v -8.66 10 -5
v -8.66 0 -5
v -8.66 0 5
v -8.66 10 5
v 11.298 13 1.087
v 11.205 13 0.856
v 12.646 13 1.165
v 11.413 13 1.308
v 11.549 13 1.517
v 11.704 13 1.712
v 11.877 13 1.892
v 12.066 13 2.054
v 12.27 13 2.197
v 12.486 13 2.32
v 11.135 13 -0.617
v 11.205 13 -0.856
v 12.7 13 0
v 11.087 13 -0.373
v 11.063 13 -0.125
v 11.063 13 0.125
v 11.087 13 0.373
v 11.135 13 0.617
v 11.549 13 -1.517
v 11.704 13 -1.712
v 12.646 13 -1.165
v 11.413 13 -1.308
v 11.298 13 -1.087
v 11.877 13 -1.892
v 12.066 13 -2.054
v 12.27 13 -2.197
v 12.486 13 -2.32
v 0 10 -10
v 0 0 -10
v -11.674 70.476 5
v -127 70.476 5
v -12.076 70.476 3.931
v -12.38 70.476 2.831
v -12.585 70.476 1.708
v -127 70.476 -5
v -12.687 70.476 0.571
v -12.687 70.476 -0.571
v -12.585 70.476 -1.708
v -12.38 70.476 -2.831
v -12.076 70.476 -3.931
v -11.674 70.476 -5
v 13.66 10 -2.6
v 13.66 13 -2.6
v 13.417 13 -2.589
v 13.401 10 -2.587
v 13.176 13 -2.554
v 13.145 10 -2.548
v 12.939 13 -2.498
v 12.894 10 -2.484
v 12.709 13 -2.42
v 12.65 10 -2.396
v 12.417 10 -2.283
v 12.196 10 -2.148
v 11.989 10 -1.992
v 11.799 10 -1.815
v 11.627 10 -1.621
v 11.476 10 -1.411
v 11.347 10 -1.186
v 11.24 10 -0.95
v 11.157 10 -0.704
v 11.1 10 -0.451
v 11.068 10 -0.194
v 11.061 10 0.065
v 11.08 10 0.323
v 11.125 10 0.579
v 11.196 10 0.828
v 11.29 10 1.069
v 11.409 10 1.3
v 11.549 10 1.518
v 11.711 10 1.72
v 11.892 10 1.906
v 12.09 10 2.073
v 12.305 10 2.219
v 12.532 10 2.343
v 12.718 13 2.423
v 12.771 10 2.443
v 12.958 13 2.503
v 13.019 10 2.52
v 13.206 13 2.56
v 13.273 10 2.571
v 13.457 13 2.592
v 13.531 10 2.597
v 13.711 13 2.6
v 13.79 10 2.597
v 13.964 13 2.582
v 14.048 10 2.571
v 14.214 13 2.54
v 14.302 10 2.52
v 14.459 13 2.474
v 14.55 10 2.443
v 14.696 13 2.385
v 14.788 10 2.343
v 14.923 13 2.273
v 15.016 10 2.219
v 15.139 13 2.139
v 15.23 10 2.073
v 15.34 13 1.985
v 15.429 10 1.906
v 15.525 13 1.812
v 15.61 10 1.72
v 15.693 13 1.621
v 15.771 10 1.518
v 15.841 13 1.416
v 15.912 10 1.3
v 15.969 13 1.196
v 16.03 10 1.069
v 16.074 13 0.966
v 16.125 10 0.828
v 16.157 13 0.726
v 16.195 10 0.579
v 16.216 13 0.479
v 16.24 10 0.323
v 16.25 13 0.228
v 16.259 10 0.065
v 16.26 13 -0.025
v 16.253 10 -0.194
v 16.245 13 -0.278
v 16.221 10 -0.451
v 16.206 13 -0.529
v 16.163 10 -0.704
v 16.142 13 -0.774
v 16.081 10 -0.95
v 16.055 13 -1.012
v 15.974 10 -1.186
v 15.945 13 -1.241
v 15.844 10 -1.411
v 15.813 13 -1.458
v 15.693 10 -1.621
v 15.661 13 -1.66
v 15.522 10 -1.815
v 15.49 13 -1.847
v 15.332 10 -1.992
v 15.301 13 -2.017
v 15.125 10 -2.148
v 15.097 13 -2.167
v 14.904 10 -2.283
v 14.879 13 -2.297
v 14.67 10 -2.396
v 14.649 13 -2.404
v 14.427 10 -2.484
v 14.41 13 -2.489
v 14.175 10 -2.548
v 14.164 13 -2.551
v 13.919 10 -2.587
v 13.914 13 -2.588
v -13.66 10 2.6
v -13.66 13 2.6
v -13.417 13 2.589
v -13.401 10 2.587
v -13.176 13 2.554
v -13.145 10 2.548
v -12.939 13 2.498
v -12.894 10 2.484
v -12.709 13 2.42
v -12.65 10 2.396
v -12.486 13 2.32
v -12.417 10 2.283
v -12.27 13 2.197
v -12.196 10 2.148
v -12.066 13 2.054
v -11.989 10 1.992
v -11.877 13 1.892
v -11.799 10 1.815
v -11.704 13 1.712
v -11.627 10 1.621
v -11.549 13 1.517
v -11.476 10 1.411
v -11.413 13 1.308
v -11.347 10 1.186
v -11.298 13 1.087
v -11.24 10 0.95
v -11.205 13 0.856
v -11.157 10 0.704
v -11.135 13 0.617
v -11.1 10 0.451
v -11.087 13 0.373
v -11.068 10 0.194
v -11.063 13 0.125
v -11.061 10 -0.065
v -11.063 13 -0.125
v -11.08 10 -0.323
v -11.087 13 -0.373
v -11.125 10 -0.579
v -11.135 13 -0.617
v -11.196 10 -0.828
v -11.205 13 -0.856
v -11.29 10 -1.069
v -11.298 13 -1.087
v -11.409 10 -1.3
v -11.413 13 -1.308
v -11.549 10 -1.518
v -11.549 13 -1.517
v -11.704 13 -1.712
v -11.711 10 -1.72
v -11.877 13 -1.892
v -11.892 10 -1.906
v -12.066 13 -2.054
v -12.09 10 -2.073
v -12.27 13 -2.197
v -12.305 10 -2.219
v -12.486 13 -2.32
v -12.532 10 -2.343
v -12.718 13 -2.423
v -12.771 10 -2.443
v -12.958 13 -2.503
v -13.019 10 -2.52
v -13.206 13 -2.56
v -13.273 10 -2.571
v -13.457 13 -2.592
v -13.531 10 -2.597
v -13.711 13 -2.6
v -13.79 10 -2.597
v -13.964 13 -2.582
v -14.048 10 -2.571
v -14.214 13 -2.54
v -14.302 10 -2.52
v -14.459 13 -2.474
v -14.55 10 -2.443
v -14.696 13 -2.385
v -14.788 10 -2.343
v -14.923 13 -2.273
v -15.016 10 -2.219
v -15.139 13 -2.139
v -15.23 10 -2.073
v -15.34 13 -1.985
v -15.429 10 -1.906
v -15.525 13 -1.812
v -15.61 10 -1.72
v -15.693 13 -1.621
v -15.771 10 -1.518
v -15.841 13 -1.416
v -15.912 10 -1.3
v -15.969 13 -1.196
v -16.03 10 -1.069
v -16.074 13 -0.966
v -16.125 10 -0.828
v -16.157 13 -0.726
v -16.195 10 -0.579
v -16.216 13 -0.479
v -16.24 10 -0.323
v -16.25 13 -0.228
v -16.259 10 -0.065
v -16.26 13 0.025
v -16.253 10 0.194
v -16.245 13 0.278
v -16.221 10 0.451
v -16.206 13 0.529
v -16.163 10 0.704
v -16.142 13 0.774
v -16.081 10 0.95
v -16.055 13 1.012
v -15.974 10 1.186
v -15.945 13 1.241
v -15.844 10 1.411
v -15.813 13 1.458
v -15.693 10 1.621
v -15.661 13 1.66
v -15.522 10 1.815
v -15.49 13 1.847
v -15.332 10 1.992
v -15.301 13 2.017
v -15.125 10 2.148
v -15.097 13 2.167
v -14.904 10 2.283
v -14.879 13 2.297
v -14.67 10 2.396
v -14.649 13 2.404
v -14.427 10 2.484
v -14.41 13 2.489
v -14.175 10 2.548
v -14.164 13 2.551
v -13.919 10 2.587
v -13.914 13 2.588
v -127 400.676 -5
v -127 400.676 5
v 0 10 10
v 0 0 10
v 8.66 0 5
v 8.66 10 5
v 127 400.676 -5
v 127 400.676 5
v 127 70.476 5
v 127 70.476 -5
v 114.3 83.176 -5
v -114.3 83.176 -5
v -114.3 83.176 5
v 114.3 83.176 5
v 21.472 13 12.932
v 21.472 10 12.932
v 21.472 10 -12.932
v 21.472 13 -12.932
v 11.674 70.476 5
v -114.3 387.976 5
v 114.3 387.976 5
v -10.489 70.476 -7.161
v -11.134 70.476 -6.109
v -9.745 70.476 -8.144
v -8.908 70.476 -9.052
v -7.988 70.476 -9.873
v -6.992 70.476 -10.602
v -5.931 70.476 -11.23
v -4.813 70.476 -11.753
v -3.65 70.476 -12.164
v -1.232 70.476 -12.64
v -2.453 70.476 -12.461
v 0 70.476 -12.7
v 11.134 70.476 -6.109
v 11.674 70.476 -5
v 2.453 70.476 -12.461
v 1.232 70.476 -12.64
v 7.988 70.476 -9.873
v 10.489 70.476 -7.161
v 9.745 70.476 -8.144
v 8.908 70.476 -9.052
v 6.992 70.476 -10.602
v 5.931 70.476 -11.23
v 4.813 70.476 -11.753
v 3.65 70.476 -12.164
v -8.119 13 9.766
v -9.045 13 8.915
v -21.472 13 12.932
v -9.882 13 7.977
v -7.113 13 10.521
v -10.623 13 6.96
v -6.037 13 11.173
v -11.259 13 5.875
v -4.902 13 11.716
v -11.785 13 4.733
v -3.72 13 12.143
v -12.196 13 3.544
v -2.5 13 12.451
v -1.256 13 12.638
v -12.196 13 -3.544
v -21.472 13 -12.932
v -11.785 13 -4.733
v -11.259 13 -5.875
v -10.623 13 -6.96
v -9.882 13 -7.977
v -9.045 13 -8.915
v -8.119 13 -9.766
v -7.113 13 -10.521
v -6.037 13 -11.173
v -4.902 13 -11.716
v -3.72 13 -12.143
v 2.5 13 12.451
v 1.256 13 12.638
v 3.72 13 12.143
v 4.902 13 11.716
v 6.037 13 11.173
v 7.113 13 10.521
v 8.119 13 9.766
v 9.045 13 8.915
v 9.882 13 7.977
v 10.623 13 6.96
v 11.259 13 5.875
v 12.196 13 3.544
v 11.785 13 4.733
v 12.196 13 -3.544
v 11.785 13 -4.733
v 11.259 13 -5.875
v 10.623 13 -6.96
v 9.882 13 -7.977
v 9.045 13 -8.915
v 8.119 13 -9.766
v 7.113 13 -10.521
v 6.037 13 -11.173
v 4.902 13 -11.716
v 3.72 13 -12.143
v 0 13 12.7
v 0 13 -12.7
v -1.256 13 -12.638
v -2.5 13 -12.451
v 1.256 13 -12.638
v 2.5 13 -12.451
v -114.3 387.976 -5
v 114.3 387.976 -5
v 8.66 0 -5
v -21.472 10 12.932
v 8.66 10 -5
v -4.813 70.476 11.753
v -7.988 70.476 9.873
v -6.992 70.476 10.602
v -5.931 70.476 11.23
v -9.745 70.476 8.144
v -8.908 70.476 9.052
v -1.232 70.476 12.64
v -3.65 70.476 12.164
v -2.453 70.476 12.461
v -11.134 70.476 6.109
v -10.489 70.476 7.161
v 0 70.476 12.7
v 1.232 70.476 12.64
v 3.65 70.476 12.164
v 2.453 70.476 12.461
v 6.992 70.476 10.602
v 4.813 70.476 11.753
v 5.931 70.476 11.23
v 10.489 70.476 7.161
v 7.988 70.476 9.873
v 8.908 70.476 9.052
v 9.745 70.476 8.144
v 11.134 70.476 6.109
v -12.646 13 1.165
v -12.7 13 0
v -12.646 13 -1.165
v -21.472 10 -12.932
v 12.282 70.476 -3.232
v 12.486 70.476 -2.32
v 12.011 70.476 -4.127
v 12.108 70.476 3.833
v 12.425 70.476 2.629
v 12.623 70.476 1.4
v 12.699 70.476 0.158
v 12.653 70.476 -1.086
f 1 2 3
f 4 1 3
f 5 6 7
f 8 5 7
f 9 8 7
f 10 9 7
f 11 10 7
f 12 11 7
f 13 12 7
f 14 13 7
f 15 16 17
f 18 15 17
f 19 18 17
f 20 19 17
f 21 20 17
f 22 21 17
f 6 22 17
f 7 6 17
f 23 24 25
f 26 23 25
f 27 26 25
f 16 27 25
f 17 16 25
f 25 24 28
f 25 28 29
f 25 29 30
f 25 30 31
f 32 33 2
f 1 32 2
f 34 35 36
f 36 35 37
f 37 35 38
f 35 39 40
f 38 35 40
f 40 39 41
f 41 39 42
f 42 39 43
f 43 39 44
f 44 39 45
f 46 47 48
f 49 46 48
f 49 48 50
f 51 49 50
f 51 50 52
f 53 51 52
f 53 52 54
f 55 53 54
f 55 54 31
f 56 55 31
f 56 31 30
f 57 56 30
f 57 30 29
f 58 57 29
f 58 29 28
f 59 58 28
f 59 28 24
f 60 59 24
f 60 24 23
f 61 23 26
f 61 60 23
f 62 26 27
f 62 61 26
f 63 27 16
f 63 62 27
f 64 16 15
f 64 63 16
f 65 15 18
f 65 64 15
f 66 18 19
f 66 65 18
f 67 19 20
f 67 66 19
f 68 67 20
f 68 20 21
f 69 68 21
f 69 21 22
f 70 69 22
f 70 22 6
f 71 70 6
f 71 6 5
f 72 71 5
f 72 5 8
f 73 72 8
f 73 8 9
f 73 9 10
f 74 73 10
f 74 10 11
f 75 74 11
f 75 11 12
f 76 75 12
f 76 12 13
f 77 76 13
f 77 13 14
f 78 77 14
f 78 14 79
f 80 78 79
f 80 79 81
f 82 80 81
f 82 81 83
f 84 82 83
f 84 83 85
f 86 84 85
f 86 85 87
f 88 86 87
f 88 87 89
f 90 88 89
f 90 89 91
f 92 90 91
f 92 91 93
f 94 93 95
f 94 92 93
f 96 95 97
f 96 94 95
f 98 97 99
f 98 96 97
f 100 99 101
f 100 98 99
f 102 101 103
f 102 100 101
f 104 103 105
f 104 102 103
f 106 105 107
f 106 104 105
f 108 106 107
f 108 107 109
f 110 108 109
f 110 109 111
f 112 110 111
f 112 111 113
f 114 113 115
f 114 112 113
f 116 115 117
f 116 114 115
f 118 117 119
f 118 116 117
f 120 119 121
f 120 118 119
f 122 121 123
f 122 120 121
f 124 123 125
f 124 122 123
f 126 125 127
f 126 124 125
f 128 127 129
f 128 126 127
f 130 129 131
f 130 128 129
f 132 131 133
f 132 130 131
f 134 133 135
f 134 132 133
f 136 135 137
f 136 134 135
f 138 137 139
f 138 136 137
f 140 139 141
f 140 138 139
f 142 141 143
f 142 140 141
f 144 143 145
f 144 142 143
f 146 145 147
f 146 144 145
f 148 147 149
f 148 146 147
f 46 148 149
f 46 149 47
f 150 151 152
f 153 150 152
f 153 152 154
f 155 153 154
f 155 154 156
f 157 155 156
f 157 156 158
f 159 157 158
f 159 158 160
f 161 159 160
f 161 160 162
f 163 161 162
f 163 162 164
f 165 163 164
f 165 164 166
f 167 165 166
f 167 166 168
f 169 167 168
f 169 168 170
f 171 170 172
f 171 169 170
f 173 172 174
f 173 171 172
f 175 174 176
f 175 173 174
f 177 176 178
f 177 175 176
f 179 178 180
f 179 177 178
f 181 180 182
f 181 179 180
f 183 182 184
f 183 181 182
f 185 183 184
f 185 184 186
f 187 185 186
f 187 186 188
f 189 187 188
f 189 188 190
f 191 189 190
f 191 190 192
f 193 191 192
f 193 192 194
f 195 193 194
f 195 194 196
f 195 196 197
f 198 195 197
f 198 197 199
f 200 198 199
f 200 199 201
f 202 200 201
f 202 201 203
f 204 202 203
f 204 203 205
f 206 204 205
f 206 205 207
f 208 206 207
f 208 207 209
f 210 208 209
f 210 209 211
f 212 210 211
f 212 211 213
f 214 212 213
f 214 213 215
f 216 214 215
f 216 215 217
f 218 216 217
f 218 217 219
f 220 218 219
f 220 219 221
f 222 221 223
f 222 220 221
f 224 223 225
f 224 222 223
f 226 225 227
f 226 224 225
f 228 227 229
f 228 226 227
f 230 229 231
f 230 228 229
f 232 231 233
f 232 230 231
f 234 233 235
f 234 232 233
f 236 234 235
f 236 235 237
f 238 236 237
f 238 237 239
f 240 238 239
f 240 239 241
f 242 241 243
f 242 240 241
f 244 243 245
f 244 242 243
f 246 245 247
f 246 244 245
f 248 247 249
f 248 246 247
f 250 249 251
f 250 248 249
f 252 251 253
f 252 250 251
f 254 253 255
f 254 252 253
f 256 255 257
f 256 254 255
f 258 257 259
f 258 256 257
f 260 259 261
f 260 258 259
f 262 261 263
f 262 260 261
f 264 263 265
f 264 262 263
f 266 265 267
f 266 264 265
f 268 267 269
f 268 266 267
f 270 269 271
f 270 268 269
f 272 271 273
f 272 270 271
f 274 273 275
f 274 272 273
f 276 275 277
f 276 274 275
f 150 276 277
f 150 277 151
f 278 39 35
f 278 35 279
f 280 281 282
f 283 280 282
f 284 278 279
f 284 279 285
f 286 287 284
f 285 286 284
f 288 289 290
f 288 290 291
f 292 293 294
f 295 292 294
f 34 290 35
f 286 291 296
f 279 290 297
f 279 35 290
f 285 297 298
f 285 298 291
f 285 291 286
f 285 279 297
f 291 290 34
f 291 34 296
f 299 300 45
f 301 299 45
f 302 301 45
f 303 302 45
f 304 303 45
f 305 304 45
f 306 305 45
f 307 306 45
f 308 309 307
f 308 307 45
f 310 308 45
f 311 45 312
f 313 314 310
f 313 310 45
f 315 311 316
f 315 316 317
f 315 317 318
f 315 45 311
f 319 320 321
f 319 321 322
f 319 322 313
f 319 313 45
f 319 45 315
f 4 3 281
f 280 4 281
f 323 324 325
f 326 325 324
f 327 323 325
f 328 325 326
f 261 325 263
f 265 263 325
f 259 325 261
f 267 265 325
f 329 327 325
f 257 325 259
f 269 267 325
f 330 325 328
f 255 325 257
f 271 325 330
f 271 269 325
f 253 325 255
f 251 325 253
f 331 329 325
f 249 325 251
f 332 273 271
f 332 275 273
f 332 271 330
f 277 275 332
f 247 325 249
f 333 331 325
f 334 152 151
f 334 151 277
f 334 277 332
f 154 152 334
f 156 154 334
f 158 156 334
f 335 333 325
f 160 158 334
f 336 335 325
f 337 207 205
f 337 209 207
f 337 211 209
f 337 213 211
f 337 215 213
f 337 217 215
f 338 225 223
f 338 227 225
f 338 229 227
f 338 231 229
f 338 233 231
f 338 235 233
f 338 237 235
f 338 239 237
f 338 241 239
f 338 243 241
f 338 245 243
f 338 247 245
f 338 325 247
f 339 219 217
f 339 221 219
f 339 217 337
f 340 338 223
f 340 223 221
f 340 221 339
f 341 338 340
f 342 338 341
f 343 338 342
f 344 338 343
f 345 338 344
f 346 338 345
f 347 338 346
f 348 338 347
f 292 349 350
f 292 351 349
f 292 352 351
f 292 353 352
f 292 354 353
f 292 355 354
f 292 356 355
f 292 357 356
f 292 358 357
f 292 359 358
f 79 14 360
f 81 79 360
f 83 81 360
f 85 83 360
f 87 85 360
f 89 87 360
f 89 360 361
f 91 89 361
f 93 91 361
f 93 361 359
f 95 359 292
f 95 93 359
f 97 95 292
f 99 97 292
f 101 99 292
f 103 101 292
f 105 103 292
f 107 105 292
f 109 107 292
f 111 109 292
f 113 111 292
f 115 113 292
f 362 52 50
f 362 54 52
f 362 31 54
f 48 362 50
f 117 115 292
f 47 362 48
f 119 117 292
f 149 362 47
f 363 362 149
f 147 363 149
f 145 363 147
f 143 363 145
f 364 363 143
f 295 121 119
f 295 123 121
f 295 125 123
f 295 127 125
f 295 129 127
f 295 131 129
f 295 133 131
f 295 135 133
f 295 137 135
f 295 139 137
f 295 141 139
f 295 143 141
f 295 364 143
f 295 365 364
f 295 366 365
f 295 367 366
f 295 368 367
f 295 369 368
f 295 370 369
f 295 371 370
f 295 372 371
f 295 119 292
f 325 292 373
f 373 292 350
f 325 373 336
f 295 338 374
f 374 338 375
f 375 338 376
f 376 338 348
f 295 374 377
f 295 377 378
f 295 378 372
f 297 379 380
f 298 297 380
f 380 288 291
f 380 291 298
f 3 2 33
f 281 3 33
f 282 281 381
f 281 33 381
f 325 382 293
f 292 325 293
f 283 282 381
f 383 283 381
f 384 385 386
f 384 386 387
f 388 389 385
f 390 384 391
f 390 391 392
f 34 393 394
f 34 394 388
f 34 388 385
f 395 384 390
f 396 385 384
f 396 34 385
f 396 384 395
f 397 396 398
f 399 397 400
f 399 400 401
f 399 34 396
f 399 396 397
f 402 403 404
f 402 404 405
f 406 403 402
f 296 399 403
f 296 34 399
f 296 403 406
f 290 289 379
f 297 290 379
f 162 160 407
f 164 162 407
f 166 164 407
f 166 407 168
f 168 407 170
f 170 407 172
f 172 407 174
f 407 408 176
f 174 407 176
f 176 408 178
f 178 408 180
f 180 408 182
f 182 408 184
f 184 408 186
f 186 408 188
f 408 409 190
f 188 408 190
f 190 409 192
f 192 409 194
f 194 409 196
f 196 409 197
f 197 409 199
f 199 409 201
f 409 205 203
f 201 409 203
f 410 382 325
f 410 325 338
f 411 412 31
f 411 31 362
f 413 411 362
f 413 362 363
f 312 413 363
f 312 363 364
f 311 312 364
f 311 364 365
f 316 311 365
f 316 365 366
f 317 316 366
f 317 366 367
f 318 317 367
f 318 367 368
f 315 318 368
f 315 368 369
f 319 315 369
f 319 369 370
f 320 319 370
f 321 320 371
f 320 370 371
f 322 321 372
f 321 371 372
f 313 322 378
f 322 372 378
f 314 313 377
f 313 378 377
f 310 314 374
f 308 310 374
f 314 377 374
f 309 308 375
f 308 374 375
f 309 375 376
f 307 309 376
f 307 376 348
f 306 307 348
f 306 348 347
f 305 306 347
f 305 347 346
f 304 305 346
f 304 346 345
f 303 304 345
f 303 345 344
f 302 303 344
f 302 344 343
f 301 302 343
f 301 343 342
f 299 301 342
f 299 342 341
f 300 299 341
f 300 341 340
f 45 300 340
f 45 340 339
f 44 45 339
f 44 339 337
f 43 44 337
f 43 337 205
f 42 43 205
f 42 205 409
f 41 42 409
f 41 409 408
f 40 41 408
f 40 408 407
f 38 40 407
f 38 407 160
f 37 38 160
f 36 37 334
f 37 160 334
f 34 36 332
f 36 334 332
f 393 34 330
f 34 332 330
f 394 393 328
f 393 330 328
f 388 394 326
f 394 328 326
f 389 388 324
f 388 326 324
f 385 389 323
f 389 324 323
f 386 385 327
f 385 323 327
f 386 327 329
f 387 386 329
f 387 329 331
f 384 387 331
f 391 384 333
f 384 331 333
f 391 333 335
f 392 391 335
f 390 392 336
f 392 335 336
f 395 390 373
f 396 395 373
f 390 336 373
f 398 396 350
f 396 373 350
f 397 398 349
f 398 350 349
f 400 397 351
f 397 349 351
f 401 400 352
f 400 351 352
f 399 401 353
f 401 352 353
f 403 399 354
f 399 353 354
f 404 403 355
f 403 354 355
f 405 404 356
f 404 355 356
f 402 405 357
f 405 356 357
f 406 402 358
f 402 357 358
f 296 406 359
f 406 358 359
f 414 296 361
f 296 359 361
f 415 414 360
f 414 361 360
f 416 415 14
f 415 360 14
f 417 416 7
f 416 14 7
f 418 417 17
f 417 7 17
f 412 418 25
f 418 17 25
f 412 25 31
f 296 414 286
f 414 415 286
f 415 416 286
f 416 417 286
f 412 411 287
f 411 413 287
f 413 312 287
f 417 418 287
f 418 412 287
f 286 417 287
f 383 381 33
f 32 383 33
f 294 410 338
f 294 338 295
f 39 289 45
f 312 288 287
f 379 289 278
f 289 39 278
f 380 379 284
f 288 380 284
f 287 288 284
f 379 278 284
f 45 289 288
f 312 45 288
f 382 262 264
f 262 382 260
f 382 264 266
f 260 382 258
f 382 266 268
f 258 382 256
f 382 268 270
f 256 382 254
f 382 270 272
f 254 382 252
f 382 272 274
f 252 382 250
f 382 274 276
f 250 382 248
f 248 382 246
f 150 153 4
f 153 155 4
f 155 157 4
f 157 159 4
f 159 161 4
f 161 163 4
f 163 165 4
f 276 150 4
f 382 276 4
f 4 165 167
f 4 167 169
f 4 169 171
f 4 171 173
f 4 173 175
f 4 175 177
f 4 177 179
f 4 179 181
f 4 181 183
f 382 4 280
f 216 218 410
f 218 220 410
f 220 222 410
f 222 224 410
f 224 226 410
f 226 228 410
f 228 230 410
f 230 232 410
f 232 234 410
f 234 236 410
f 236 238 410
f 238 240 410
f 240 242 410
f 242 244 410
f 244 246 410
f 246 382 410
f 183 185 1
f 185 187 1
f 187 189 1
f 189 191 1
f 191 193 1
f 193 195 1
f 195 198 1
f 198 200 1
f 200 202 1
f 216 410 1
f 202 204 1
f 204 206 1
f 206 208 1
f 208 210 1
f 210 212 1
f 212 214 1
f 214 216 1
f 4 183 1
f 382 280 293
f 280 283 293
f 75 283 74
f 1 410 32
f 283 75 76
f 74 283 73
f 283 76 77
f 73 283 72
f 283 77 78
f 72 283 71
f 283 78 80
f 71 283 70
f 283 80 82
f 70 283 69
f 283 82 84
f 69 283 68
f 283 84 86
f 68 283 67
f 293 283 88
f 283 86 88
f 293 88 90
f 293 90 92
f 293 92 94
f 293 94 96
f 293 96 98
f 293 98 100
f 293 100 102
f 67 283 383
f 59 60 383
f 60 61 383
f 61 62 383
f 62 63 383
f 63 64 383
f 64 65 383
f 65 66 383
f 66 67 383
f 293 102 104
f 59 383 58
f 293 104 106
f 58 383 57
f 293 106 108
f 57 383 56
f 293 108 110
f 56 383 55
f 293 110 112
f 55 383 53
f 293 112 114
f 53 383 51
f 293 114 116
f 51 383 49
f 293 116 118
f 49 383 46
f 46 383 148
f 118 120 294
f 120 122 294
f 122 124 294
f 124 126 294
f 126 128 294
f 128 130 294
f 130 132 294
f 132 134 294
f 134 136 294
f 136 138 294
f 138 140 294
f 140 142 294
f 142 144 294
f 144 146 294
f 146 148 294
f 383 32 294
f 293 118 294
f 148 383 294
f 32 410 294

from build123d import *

# Parameters (mm, degrees)
BOSS_EXTRUDE1_DEPTH      = 10
SKETCH2_W                = 42.944936058
SKETCH2_H                = 25.863004624
SKETCH2_R                = 2.6
BOSS_EXTRUDE2_DEPTH      = 3
SKETCH3_R                = 12.7
BOSS_EXTRUDE5_DEPTH      = 57.47647
BOSS_EXTRUDE4_DEPTH      = 5
BOSS_EXTRUDE4_DEPTH_BACK = 5
SKETCH4_W                = 254
SKETCH4_H                = 330.2
SKETCH4_W_2              = 228.6
SKETCH4_H_2              = 304.8


with BuildPart() as part:
    # Sketch1 → Boss-Extrude1 (new body)
    with BuildSketch(Plane(origin=(0, 0, 0), x_dir=(1, 0, 0), z_dir=(0, 1, 0))):
        Polygon((0, 10), (-8.660254038, 5), (-8.660254038, -5), (0, -10), (8.660254038, -5), (8.660254038, 5), align=None)
    extrude(amount=BOSS_EXTRUDE1_DEPTH)

    # Sketch2 → Boss-Extrude2 (add)
    with BuildSketch(Plane(origin=(0, 10, 0), x_dir=(1, 0, 0), z_dir=(0, 1, 0))):
        Rectangle(SKETCH2_W, SKETCH2_H)
        with Locations(Location((-13.660254038, 0, 0), (0, 0, 270))):
            Circle(SKETCH2_R, mode=Mode.SUBTRACT)
        with Locations(Location((13.660254038, 0, 0), (0, 0, 90))):
            Circle(SKETCH2_R, mode=Mode.SUBTRACT)
    extrude(amount=BOSS_EXTRUDE2_DEPTH)

    # Sketch3 → Boss-Extrude5 (add)
    with BuildSketch(Plane(origin=(0, 13, 0), x_dir=(1, 0, 0), z_dir=(0, 1, 0))):
        with Locations(Location((0, 0, 0), (0, 0, 10.525215122))):
            Circle(SKETCH3_R)
    extrude(amount=BOSS_EXTRUDE5_DEPTH)

    # Sketch4 → Boss-Extrude4 (add, two sides: drawn at the far end of the back side and taken through both)
    with BuildSketch(Plane.XY.offset(-BOSS_EXTRUDE4_DEPTH_BACK)):
        with Locations((0, 235.57647)):
            Rectangle(SKETCH4_W, SKETCH4_H)
        with Locations((0, 235.57647)):
            Rectangle(SKETCH4_W_2, SKETCH4_H_2, mode=Mode.SUBTRACT)
    extrude(amount=BOSS_EXTRUDE4_DEPTH + BOSS_EXTRUDE4_DEPTH_BACK)


solid = part.part
